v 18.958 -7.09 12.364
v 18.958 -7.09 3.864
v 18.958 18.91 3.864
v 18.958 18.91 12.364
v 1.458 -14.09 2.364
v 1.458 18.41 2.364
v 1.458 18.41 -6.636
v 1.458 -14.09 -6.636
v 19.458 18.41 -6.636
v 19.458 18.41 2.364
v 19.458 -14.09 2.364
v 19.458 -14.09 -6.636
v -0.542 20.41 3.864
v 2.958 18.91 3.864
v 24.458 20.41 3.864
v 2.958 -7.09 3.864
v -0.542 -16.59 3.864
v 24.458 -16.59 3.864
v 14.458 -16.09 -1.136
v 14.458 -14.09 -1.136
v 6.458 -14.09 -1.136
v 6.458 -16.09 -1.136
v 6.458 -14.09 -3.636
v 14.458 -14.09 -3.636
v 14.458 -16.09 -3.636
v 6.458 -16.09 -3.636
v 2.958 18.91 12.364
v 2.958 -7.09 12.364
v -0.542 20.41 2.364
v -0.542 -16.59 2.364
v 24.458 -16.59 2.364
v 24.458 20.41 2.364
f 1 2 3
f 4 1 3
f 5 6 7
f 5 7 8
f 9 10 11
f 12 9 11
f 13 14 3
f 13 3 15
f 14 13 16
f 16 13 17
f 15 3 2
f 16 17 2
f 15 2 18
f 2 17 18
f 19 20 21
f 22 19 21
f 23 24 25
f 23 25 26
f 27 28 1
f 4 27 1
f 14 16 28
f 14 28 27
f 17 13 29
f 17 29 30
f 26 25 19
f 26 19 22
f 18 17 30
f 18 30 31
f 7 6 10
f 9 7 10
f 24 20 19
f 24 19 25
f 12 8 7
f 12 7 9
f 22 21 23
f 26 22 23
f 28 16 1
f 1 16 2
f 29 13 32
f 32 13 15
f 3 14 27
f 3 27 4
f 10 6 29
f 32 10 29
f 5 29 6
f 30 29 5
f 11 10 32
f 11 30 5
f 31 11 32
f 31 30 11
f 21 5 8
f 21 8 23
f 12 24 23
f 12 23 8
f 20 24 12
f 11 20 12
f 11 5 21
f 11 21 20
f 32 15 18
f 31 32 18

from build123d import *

# Parameters (mm, degrees)
SKETCH_W             = 25
SKETCH_H             = 37
PAD_DEPTH            = 1.5
SKETCH001_W          = 16
SKETCH001_H          = 26
PAD001_DEPTH         = 8.5
SKETCH002_W          = 18
SKETCH002_H          = 32.5
PAD002_DEPTH         = 9
SKETCH003_W          = 8
SKETCH003_H          = 2.5
PAD003_DEPTH         = 2
BODY_PITCH_ANGLE     = 90
BODY_PLACEMENT_ANGLE = -90


with BuildPart() as part:
    # Sketch → Pad (new body)
    with BuildSketch(Plane.YZ):
        with Locations((4.273874, -1.909899)):
            Rectangle(SKETCH_W, SKETCH_H)
    extrude(amount=PAD_DEPTH)

    # Sketch001 (on Face5 of Pad) → Pad001 (join)
    with BuildSketch(Plane(origin=(0, 0, 0), x_dir=(0, 1, 0), z_dir=(-1, 0, 0))):
        with Locations((3.273874, 5.909899)):
            Rectangle(SKETCH001_W, SKETCH001_H)
    extrude(amount=PAD001_DEPTH)

    # Sketch002 (on Face5 of Pad001) → Pad002 (join)
    with BuildSketch(Plane.YZ.offset(1.5)):
        with Locations((2.773874, -2.159899)):
            Rectangle(SKETCH002_W, SKETCH002_H)
    extrude(amount=PAD002_DEPTH)

    # Sketch003 (on Face14 of Pad002) → Pad003 (join)
    with BuildSketch(Plane(origin=(0, 0, 14.090101), x_dir=(0, -1, 0), z_dir=(0, 0, 1))):
        with Locations((-2.773874, 6.25)):
            Rectangle(SKETCH003_W, SKETCH003_H)
    extrude(amount=PAD003_DEPTH)


with BuildPart() as part_1:
    # Body pitch: moved
    add(part.part.rotate(Axis((0, 0, 0), (0, 1, 0)), BODY_PITCH_ANGLE))


with BuildPart() as part_2:
    # Body placement: moved
    add(part_1.part.moved(Location((7.68397, -0.0001, 3.86387))).rotate(Axis((7.68397, -0.0001, 3.86387), (0, 0, 1)), BODY_PLACEMENT_ANGLE))


solid = part_2.part
